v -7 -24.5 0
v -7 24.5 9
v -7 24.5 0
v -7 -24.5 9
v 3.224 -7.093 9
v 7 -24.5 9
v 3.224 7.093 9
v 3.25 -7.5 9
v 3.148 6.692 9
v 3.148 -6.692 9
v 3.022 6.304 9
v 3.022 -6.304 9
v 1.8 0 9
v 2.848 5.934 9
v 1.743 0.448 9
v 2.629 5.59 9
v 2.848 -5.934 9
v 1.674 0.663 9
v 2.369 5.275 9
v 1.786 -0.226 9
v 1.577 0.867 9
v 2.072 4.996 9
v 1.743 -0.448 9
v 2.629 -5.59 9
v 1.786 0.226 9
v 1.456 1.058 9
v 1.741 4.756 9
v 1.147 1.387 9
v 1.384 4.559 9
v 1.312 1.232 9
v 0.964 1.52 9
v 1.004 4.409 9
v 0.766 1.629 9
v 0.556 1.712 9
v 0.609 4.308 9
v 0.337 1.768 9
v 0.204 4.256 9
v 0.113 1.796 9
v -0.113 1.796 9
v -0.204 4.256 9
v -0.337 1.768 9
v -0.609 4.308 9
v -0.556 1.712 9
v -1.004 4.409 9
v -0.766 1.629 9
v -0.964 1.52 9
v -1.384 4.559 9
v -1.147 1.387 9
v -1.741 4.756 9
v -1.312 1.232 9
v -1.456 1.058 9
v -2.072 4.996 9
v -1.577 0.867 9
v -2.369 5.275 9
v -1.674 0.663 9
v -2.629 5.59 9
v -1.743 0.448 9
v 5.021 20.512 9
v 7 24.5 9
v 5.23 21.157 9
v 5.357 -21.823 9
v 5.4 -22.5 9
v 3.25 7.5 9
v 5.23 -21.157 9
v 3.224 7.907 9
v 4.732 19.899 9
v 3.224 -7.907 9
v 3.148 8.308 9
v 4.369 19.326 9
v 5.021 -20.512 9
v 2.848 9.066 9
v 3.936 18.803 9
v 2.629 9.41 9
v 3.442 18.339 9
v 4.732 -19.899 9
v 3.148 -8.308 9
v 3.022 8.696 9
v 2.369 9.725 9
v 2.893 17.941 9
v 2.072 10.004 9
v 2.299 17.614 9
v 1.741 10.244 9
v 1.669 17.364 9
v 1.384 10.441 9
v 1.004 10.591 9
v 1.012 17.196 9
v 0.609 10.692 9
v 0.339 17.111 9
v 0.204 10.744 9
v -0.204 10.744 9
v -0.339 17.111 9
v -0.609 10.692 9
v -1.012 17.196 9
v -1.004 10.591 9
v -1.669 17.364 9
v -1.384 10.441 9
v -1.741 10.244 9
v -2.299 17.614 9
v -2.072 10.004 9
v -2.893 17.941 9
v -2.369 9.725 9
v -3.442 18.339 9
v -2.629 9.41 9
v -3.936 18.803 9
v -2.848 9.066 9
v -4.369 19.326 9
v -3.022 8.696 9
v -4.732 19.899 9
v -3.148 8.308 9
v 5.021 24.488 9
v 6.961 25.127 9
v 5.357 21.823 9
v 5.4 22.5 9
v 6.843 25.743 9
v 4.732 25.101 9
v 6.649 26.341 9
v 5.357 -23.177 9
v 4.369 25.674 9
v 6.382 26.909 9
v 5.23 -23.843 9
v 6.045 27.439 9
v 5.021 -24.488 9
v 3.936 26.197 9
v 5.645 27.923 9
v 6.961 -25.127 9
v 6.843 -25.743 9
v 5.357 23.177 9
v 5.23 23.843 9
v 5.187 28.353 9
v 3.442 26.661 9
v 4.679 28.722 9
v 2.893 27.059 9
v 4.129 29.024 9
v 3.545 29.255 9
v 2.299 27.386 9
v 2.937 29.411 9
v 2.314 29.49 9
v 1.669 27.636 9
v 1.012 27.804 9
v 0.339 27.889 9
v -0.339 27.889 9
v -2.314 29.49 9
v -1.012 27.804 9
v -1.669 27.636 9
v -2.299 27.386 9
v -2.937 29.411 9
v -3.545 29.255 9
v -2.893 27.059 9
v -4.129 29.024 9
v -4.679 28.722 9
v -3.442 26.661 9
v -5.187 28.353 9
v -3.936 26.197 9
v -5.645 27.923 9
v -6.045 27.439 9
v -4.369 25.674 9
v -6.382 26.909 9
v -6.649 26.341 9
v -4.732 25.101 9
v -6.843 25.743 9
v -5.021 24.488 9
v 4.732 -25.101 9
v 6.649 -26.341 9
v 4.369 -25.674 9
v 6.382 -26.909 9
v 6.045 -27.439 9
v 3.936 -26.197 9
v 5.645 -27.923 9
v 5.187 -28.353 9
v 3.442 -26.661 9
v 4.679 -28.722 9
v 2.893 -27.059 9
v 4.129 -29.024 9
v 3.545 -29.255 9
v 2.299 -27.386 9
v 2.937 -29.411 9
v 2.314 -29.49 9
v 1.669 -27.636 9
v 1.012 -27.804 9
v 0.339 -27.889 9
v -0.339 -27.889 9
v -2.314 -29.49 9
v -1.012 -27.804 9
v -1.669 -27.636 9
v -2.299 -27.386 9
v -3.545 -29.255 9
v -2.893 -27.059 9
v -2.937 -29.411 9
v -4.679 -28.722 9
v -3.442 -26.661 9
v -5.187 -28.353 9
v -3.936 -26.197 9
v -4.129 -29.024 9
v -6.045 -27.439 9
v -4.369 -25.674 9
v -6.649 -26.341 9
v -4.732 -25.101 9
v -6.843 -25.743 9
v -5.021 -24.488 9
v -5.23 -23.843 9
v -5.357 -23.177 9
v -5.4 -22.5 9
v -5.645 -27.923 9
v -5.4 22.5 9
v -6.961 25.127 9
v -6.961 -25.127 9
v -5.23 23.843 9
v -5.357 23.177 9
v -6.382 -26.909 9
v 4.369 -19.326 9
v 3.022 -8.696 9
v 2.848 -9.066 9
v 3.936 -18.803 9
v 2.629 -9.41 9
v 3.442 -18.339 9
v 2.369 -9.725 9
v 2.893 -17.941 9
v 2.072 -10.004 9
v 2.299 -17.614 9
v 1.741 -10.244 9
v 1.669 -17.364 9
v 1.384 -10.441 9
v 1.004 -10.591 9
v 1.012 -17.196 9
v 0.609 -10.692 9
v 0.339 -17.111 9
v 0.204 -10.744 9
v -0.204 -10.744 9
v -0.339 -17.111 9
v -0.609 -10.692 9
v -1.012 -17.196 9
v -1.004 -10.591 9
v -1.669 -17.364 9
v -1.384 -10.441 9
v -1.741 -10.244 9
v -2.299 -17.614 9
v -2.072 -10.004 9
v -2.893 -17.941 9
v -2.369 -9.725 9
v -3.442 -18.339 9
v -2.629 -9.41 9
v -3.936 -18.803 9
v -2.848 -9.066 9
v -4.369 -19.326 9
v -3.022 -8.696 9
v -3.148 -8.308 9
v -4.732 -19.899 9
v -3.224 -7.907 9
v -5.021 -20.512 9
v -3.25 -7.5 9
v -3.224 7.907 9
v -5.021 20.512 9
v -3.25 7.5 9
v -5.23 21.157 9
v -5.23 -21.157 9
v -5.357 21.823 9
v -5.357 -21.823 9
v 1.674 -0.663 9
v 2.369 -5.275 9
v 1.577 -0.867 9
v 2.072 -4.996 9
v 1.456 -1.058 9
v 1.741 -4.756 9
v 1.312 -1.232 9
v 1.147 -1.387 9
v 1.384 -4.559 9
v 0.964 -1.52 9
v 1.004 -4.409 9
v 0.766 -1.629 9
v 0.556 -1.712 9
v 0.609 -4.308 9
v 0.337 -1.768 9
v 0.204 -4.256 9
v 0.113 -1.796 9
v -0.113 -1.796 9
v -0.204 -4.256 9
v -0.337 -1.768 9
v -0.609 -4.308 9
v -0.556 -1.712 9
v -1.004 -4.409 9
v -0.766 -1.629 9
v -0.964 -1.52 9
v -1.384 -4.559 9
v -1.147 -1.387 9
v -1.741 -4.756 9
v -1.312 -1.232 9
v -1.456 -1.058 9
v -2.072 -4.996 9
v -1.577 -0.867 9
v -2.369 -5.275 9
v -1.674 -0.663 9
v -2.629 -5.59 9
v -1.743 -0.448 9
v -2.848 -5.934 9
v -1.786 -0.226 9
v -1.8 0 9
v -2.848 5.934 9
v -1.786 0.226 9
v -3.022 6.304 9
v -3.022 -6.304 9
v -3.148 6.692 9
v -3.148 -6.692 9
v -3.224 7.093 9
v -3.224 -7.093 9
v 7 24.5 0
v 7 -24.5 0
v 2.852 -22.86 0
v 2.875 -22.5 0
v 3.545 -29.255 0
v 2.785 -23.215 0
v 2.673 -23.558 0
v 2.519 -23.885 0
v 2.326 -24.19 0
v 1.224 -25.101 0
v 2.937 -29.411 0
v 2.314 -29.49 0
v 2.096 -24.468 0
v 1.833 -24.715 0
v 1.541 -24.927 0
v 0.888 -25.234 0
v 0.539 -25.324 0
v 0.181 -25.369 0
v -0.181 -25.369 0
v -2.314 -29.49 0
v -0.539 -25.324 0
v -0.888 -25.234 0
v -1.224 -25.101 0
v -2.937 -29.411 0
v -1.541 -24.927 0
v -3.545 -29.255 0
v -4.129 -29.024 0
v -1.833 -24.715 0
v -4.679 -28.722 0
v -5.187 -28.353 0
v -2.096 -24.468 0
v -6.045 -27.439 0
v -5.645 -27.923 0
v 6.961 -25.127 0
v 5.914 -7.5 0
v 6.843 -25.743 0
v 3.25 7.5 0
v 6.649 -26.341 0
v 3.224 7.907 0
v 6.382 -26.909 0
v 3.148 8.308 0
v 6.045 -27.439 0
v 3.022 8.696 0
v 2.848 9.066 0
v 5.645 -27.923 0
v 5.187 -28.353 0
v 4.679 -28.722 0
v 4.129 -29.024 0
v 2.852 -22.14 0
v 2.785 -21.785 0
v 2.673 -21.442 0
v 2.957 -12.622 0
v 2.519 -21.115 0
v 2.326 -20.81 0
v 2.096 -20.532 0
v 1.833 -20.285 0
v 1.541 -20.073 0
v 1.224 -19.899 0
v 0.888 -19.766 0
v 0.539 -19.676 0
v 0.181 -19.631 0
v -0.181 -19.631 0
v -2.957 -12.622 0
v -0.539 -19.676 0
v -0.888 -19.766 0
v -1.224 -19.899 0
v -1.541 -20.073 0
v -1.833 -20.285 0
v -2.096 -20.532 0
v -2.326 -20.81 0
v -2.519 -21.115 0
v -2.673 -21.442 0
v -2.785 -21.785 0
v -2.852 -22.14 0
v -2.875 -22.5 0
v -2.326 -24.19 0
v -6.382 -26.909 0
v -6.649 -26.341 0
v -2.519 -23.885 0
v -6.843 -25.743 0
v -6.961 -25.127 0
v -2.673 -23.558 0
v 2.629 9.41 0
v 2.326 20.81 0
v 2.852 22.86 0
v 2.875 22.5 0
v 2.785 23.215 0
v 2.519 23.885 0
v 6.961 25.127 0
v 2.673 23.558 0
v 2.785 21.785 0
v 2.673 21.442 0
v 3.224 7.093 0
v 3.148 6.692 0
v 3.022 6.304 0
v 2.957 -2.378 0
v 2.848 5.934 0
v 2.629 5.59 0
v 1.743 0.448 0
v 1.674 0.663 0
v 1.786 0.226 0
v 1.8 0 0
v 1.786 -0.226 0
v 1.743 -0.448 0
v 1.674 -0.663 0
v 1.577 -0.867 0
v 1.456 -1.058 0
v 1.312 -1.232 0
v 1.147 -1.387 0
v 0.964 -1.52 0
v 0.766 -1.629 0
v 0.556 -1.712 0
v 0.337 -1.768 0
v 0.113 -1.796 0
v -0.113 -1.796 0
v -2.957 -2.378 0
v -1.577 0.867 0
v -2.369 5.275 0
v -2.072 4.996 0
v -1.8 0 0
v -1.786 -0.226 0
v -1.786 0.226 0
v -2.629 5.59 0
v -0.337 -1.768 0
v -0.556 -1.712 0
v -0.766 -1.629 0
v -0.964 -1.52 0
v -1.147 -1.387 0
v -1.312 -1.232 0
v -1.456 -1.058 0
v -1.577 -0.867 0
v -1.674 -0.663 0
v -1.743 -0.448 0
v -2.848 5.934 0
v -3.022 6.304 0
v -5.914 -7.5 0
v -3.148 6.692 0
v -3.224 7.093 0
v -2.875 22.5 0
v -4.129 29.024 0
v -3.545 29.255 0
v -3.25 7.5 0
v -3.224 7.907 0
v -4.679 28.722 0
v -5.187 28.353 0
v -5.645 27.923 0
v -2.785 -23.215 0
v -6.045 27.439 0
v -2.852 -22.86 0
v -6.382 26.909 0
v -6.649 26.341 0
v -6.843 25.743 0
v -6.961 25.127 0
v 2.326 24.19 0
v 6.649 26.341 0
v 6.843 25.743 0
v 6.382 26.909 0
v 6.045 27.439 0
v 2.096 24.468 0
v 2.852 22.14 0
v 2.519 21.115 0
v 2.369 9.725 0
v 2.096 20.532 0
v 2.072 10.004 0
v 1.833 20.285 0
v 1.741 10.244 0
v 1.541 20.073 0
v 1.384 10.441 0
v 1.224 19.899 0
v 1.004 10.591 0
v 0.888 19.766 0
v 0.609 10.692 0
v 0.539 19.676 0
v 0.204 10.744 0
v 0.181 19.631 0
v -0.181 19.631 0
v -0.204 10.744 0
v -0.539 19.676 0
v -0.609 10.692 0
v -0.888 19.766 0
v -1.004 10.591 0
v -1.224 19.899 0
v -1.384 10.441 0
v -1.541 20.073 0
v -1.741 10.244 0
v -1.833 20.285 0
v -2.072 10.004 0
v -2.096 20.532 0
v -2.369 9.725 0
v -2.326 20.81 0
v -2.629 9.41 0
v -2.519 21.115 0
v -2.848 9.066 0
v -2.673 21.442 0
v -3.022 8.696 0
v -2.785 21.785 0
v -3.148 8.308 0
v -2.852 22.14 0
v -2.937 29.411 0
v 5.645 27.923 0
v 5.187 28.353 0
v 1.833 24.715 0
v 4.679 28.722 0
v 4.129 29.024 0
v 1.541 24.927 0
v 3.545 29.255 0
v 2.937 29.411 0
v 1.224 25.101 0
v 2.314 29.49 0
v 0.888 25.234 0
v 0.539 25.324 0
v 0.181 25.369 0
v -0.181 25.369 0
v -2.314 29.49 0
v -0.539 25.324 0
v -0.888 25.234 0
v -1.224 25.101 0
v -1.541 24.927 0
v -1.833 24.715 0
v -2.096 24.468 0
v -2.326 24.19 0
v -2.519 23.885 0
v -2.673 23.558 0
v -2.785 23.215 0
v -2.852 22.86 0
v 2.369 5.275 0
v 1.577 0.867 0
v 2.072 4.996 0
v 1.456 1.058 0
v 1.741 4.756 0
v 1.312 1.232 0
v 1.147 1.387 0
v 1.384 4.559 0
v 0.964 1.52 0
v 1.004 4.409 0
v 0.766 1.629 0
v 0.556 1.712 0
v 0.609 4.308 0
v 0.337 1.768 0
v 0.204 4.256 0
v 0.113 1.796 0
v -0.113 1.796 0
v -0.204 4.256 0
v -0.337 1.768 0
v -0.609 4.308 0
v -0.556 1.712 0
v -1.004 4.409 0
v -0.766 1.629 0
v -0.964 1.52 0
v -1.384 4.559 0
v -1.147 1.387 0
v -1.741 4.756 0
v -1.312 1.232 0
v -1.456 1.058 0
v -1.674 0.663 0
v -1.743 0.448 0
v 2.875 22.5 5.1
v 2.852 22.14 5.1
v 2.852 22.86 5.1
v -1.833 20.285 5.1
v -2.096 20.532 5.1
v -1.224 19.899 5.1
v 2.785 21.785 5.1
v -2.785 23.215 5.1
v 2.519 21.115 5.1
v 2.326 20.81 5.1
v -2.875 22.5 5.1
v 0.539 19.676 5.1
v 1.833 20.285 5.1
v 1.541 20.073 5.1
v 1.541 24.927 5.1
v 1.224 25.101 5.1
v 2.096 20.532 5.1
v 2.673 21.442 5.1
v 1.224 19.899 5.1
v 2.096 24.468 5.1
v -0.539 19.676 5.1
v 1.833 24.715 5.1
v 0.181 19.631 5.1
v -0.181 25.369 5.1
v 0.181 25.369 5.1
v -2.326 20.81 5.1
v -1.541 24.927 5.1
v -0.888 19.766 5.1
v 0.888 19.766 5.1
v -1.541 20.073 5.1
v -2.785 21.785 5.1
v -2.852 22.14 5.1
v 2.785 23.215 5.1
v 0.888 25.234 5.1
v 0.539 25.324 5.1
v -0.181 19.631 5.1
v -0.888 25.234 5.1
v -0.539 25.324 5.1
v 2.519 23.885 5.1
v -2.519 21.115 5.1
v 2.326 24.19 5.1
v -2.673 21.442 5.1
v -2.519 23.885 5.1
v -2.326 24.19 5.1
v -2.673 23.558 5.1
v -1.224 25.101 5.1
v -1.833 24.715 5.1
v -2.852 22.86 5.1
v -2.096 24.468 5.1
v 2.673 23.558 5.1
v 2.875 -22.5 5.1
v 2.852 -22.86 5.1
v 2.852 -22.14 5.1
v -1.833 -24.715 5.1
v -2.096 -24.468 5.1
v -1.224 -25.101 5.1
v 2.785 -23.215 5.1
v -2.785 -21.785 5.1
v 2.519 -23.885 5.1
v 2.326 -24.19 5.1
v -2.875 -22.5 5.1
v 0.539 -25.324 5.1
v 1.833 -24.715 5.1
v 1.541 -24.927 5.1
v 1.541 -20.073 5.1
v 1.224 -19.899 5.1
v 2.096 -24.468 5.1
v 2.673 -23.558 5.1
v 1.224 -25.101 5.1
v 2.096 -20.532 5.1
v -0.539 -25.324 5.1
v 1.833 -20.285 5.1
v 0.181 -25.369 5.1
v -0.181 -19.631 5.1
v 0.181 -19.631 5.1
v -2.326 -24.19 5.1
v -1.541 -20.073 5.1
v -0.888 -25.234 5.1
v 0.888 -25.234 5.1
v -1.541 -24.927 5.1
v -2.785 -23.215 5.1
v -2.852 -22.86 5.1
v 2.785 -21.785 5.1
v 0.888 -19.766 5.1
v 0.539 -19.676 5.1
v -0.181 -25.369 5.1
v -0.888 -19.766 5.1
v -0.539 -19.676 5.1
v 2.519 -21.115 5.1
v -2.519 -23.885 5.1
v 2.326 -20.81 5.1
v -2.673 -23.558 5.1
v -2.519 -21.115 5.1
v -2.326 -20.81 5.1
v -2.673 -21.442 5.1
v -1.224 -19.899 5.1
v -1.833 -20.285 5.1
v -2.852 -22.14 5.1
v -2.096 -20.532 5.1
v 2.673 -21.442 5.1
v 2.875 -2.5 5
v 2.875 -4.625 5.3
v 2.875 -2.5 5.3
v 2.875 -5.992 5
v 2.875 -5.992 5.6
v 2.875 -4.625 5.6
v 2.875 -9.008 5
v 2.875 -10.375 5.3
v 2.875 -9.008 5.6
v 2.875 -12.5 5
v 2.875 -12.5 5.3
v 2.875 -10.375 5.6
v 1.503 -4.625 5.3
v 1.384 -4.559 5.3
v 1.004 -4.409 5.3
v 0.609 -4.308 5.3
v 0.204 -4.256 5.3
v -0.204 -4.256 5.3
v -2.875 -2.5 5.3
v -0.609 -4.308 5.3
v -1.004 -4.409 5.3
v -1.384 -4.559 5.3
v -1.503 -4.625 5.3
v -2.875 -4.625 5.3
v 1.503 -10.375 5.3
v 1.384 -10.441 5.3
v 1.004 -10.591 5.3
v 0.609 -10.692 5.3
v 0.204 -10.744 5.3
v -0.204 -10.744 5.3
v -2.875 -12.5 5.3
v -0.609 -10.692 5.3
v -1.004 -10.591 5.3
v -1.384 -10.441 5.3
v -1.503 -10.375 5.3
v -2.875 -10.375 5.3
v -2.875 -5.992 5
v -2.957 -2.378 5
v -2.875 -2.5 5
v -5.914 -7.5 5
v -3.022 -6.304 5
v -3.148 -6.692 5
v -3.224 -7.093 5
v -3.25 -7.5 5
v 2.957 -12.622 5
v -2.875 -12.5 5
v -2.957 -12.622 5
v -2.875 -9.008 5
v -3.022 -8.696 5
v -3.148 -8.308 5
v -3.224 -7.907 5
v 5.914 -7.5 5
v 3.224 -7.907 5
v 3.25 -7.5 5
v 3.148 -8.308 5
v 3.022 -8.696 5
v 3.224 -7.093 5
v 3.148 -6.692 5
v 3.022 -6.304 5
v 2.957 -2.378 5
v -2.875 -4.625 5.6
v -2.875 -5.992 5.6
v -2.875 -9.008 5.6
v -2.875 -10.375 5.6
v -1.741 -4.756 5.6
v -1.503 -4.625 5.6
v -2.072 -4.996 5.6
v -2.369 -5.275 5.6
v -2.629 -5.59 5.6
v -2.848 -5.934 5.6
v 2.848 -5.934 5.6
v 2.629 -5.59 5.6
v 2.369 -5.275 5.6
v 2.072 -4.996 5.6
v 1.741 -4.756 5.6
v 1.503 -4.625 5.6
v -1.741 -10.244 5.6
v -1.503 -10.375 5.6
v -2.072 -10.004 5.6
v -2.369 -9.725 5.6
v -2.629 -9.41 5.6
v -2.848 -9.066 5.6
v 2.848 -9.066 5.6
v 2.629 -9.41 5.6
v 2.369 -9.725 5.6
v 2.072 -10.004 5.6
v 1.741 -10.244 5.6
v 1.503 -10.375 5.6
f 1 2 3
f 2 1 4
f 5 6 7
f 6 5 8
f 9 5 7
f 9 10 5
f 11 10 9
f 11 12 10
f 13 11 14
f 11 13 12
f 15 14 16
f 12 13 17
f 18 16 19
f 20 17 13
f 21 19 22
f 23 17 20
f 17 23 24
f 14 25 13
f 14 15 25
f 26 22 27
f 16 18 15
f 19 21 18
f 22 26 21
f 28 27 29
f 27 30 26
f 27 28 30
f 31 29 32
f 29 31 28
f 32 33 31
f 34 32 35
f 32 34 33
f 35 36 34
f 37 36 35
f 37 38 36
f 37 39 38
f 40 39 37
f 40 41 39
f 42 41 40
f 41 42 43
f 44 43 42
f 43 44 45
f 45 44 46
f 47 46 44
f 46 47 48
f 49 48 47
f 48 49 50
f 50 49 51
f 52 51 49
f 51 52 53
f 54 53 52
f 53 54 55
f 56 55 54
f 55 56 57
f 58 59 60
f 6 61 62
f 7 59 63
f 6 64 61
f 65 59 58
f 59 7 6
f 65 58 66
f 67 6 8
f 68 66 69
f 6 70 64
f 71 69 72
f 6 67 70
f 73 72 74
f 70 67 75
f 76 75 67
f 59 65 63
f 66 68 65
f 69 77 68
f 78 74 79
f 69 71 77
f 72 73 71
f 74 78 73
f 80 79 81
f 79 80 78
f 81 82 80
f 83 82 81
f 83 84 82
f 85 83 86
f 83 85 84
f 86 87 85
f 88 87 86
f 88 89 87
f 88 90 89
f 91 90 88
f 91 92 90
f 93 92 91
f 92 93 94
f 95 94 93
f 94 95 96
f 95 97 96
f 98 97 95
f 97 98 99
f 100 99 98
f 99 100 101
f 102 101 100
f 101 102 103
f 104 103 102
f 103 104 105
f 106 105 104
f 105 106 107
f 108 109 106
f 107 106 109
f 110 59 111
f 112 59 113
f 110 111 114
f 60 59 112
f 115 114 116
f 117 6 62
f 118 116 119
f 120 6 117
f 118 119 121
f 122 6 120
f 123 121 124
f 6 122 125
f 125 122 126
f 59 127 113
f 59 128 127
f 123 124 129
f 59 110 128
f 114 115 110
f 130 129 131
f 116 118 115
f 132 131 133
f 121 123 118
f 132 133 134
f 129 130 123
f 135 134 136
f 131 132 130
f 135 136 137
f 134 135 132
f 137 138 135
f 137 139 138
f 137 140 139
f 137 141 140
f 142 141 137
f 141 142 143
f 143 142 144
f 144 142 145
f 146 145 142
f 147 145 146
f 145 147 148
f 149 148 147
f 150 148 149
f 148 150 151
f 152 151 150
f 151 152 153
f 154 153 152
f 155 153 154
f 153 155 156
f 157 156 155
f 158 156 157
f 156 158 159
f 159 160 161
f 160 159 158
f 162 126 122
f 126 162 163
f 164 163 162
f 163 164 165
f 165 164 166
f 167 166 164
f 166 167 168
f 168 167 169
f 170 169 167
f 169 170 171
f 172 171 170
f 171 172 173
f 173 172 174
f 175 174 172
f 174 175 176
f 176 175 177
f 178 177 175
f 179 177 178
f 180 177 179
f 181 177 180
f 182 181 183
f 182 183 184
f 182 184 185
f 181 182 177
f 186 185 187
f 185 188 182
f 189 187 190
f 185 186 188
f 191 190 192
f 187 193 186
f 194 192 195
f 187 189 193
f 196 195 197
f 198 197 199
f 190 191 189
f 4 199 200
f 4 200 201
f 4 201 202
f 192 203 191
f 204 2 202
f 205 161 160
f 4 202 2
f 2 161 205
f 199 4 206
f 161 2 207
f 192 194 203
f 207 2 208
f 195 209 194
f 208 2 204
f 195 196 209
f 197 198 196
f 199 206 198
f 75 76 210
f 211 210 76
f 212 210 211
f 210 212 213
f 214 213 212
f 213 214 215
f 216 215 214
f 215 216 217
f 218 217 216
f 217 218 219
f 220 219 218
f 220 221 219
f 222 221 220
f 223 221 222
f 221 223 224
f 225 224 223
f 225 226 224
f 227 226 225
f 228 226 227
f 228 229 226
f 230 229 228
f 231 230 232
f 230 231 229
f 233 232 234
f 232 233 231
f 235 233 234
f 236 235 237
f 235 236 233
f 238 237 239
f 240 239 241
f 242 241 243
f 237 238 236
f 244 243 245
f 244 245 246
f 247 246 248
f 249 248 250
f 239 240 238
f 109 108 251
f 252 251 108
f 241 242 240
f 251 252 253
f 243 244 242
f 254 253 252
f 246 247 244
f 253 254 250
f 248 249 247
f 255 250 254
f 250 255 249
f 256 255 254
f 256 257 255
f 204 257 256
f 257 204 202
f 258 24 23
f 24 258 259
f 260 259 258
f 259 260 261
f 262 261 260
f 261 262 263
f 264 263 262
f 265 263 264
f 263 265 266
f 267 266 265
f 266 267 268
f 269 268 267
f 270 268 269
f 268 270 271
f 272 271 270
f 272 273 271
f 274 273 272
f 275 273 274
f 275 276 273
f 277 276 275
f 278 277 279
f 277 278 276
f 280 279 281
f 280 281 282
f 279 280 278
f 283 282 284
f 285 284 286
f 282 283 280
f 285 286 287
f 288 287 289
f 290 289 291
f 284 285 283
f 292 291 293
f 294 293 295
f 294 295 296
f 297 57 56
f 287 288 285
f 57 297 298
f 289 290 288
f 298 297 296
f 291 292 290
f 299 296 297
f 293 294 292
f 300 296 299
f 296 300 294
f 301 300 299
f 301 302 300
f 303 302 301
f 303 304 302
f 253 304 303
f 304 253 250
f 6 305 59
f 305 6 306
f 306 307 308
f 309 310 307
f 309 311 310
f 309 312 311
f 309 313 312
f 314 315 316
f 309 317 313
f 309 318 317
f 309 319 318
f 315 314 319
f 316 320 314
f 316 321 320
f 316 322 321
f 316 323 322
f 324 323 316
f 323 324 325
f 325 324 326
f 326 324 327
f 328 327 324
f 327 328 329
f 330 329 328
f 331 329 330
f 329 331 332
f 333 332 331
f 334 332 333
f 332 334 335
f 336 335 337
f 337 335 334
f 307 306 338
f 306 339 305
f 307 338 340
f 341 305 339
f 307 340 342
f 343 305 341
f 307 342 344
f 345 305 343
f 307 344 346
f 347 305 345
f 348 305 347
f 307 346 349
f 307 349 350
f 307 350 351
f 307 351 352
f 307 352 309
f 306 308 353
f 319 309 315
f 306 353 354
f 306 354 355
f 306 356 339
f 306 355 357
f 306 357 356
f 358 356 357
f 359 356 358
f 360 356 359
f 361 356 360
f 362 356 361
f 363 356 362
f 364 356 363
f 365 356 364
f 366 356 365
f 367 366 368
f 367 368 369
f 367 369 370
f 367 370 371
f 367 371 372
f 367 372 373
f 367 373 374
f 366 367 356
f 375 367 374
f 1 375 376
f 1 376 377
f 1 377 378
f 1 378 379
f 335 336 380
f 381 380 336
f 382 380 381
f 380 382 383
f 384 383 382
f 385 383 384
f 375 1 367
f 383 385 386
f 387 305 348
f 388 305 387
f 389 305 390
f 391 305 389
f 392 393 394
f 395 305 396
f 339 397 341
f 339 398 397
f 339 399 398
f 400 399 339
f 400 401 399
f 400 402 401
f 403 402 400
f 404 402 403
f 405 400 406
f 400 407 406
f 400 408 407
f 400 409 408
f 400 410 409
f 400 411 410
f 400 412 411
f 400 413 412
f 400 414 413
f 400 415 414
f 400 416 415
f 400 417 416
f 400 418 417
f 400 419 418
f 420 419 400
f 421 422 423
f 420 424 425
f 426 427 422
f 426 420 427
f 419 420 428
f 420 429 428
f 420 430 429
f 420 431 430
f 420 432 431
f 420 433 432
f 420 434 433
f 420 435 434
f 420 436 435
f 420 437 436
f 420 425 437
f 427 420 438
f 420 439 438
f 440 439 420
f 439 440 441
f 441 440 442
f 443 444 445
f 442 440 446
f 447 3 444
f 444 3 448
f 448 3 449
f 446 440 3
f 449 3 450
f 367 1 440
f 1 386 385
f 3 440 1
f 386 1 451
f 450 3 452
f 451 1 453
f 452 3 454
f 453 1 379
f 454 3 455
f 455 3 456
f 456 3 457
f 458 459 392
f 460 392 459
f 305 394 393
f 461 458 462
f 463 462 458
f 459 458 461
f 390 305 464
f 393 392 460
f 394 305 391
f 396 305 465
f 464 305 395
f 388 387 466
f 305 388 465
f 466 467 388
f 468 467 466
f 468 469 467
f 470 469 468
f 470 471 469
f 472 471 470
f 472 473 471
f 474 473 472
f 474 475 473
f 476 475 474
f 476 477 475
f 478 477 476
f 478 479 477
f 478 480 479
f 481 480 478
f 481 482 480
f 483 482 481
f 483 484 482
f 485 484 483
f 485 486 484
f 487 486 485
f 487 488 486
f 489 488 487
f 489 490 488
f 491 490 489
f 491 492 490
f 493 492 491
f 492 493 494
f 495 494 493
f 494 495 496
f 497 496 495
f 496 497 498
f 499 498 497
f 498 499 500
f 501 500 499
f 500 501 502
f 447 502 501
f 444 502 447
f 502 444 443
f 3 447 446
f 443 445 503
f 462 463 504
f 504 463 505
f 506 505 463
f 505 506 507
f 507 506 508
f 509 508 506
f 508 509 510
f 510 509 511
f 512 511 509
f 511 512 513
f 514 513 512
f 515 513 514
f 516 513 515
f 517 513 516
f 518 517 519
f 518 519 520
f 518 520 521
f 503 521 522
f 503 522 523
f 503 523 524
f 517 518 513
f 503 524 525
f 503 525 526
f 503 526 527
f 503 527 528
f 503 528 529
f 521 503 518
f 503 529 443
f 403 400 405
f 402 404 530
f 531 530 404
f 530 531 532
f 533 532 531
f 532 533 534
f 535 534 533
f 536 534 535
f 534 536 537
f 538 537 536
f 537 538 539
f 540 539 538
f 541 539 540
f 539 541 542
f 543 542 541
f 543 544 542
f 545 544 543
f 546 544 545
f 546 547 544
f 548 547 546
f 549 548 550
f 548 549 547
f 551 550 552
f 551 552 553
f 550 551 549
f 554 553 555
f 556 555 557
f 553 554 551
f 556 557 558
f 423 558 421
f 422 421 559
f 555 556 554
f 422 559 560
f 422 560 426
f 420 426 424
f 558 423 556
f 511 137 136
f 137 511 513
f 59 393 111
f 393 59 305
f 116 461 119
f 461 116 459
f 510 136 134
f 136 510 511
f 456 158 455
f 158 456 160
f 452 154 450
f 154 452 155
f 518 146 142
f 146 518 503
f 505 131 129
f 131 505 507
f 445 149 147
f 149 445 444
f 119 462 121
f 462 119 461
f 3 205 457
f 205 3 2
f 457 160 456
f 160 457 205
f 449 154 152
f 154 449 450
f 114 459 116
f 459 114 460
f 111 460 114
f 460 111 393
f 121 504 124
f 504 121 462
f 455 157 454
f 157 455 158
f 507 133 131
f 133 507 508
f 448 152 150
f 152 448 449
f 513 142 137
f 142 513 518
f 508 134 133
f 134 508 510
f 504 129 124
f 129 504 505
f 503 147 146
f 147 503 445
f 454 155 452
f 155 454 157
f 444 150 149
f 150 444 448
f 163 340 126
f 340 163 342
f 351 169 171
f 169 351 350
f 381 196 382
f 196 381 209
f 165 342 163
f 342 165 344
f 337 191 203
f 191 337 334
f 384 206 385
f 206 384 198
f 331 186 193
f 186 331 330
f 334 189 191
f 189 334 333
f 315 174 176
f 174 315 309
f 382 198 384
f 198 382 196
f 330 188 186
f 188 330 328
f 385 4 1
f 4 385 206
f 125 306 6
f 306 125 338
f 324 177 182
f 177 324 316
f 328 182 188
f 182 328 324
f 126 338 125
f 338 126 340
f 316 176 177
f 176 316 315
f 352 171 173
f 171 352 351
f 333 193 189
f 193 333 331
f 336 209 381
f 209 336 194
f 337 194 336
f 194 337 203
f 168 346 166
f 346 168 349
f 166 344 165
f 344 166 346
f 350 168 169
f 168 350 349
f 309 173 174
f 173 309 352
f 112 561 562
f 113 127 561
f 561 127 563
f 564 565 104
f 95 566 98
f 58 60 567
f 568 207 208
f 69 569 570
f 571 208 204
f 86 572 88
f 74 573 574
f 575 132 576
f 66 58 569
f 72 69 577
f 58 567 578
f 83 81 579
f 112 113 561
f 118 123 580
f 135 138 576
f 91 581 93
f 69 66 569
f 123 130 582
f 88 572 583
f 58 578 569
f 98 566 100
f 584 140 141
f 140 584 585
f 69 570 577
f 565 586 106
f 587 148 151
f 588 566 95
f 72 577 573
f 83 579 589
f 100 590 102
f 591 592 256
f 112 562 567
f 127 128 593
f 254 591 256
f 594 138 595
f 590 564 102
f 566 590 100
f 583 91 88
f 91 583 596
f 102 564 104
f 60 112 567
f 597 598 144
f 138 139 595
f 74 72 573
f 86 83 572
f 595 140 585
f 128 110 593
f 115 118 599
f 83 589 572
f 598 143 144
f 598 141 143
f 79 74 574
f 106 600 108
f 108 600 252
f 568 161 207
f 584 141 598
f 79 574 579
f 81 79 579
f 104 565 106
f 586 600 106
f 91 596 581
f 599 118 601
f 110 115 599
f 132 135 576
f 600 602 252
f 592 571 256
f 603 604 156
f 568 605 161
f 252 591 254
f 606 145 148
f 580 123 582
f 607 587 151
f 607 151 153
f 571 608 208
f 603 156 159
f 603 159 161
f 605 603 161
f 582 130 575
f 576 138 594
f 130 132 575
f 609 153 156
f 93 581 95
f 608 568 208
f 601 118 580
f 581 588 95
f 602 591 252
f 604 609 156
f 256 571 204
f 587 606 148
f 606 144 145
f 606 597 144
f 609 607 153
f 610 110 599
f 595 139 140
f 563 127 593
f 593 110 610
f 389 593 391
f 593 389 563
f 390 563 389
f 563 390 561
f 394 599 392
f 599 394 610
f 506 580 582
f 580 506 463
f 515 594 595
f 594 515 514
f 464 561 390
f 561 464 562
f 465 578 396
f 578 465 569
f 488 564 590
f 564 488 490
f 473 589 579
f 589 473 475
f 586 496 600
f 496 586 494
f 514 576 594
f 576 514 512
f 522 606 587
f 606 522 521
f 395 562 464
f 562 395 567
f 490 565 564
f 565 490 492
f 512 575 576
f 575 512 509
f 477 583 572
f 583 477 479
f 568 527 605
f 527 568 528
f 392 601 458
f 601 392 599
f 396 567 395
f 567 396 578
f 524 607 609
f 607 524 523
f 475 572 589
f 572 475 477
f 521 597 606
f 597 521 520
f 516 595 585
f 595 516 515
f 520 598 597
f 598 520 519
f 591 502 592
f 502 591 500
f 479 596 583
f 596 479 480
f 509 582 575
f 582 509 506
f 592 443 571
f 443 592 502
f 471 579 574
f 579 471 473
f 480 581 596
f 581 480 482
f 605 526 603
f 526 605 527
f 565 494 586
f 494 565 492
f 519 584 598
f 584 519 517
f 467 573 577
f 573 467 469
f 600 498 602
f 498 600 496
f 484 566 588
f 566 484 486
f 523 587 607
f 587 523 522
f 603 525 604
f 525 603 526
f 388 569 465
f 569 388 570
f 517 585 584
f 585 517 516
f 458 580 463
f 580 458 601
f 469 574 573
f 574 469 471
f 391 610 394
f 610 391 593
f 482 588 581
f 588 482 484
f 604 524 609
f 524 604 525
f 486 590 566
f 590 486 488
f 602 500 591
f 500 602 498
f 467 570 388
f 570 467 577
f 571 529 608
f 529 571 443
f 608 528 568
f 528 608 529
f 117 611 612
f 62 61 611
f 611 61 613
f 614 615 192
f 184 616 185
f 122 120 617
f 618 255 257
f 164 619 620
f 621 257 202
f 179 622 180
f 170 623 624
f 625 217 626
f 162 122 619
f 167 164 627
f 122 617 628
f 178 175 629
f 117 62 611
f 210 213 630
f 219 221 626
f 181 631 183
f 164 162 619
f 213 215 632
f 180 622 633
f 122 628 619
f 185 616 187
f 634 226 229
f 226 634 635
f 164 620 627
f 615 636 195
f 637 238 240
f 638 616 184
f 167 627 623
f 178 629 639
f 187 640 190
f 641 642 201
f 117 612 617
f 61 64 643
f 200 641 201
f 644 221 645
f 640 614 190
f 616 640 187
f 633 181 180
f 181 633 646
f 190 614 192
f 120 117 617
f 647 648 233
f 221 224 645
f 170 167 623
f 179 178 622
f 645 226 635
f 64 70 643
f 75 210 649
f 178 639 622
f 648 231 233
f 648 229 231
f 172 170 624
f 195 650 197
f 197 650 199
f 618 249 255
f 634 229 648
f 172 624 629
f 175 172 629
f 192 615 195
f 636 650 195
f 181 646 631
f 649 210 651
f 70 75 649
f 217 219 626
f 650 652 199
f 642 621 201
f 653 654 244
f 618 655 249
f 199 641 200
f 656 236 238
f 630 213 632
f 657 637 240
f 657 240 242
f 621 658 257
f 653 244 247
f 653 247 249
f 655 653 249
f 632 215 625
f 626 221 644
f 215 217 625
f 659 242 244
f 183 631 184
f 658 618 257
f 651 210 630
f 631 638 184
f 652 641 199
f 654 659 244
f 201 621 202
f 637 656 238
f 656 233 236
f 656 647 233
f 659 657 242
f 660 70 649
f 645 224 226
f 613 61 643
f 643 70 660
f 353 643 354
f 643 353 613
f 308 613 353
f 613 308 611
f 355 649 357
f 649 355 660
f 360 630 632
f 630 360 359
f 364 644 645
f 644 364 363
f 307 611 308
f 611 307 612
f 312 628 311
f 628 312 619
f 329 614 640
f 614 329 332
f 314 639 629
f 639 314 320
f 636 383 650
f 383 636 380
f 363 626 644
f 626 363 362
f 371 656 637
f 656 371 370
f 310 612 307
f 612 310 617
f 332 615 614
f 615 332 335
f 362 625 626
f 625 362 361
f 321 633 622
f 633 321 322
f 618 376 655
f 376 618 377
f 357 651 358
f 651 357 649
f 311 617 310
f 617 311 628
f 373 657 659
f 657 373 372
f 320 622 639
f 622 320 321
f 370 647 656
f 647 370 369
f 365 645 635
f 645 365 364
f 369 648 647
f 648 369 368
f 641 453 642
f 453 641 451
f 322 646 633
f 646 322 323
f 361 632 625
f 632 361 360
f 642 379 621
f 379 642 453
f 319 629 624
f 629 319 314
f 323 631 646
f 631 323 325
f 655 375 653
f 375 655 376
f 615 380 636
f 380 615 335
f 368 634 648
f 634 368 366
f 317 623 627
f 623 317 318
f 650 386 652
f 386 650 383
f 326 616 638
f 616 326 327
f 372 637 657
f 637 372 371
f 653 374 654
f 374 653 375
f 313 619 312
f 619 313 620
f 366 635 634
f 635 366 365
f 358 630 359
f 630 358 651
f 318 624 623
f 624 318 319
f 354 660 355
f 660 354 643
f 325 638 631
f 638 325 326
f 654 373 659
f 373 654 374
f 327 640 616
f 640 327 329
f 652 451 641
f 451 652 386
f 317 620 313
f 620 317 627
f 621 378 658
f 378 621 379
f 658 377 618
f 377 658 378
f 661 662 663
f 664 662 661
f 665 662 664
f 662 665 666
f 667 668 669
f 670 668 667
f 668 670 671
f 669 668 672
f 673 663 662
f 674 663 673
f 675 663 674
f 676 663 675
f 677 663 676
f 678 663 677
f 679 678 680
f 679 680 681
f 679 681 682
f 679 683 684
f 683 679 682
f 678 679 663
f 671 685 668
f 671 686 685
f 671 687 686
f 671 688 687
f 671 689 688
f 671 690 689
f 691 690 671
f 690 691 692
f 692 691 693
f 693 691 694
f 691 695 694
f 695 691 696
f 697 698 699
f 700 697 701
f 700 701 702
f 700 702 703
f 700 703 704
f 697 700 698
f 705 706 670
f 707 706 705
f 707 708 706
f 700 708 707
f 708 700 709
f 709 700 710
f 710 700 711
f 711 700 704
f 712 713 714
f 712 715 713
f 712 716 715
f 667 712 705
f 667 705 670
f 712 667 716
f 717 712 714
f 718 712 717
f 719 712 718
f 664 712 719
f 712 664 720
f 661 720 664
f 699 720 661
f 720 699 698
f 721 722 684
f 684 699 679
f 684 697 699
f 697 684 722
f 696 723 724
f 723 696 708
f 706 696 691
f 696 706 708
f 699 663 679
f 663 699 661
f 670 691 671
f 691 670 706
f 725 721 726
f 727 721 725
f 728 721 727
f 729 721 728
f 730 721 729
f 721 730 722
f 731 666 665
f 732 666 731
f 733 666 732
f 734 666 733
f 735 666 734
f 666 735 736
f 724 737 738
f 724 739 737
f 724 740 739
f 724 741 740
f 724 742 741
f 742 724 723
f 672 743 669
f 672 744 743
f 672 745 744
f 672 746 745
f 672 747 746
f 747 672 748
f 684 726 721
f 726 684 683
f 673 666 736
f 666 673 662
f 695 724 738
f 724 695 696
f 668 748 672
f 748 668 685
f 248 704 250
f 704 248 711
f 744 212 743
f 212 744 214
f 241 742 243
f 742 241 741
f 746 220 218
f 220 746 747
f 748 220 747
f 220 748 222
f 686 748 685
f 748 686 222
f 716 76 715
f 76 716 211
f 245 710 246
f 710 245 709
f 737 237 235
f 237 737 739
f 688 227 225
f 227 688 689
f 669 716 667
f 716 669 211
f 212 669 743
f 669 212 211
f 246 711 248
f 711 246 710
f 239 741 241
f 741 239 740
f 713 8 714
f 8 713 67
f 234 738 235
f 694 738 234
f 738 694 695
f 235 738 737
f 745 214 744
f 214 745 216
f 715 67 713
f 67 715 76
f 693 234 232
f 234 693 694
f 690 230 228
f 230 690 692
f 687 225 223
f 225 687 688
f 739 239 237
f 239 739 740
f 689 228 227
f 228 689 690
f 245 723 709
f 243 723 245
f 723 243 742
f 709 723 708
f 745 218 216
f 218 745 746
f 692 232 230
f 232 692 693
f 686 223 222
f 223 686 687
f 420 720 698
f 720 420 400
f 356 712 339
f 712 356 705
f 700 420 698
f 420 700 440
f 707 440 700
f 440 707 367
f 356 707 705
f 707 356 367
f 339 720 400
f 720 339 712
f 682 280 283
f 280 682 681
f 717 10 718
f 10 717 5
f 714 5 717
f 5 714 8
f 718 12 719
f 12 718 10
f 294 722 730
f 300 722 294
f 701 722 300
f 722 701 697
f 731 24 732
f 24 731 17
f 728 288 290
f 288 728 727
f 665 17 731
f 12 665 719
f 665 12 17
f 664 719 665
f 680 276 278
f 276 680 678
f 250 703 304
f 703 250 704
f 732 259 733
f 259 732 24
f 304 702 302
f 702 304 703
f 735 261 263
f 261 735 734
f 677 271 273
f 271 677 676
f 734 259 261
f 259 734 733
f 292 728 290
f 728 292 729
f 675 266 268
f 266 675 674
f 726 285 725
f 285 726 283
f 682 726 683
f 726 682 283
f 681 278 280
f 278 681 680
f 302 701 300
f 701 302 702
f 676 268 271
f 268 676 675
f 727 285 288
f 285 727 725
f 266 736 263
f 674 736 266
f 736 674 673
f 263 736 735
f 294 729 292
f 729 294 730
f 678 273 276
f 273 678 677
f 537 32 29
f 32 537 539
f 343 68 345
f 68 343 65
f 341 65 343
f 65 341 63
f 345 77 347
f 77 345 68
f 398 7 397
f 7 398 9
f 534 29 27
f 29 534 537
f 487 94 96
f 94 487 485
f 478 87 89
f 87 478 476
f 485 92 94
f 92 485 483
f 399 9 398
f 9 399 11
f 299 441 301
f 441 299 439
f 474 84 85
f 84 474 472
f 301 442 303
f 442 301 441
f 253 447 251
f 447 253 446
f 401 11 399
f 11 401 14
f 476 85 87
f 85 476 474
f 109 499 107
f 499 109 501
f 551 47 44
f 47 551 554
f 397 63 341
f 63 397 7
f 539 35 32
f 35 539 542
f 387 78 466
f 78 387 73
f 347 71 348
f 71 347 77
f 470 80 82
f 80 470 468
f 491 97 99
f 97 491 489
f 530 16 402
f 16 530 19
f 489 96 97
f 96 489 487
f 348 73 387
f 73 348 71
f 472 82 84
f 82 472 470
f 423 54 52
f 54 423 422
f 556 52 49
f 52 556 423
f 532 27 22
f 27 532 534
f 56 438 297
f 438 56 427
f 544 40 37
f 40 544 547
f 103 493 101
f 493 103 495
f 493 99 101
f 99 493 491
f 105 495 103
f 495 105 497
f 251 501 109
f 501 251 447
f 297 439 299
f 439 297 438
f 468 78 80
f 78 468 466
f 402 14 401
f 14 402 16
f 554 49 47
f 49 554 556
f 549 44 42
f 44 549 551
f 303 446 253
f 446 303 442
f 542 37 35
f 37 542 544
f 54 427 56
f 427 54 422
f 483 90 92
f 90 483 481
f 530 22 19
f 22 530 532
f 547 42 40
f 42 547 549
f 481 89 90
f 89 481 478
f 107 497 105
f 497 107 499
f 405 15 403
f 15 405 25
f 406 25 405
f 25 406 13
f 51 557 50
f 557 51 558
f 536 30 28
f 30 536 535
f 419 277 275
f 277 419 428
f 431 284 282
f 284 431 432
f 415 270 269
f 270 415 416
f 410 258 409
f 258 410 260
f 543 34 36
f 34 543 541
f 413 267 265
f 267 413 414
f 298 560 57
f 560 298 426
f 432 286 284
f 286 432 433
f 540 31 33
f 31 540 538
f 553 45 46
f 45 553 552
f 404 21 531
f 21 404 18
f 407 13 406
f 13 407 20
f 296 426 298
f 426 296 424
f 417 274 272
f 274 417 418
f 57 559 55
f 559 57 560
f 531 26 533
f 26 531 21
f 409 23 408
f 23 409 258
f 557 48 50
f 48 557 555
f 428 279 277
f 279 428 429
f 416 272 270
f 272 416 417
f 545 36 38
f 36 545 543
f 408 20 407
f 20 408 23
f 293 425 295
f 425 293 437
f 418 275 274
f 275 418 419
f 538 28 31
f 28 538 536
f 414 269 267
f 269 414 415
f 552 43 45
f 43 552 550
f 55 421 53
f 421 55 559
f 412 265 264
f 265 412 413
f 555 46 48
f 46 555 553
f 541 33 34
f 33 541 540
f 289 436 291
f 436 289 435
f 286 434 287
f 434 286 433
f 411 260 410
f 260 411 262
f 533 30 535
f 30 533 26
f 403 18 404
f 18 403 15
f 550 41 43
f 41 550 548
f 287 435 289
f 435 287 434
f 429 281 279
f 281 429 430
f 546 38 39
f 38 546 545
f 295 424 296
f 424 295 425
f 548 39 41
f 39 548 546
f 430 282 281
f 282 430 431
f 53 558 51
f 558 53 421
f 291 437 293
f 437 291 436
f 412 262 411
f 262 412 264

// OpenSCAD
$fn = 50;


difference() {
	union() {
		hull() {
			translate(v = [-2.0000000000, 9.5000000000, 0]) {
				cylinder(h = 9, r = 5);
			}
			translate(v = [2.0000000000, 9.5000000000, 0]) {
				cylinder(h = 9, r = 5);
			}
			translate(v = [-2.0000000000, -9.5000000000, 0]) {
				cylinder(h = 9, r = 5);
			}
			translate(v = [2.0000000000, -9.5000000000, 0]) {
				cylinder(h = 9, r = 5);
			}
		}
		translate(v = [0.0000000000, 15.0000000000, 0]) {
			hull() {
				translate(v = [-2.0000000000, 9.5000000000, 0]) {
					cylinder(h = 9, r = 5);
				}
				translate(v = [2.0000000000, 9.5000000000, 0]) {
					cylinder(h = 9, r = 5);
				}
				translate(v = [-2.0000000000, -9.5000000000, 0]) {
					cylinder(h = 9, r = 5);
				}
				translate(v = [2.0000000000, -9.5000000000, 0]) {
					cylinder(h = 9, r = 5);
				}
			}
		}
		translate(v = [0.0000000000, 15.0000000000, 0]) {
			hull() {
				translate(v = [-2.0000000000, 9.5000000000, 0]) {
					cylinder(h = 9, r = 5);
				}
				translate(v = [2.0000000000, 9.5000000000, 0]) {
					cylinder(h = 9, r = 5);
				}
				translate(v = [-2.0000000000, -9.5000000000, 0]) {
					cylinder(h = 9, r = 5);
				}
				translate(v = [2.0000000000, -9.5000000000, 0]) {
					cylinder(h = 9, r = 5);
				}
			}
		}
		translate(v = [0.0000000000, -15.0000000000, 0]) {
			hull() {
				translate(v = [-2.0000000000, 9.5000000000, 0]) {
					cylinder(h = 9, r = 5);
				}
				translate(v = [2.0000000000, 9.5000000000, 0]) {
					cylinder(h = 9, r = 5);
				}
				translate(v = [-2.0000000000, -9.5000000000, 0]) {
					cylinder(h = 9, r = 5);
				}
				translate(v = [2.0000000000, -9.5000000000, 0]) {
					cylinder(h = 9, r = 5);
				}
			}
		}
		translate(v = [0.0000000000, -15.0000000000, 0]) {
			hull() {
				translate(v = [-2.0000000000, 9.5000000000, 0]) {
					cylinder(h = 9, r = 5);
				}
				translate(v = [2.0000000000, 9.5000000000, 0]) {
					cylinder(h = 9, r = 5);
				}
				translate(v = [-2.0000000000, -9.5000000000, 0]) {
					cylinder(h = 9, r = 5);
				}
				translate(v = [2.0000000000, -9.5000000000, 0]) {
					cylinder(h = 9, r = 5);
				}
			}
		}
	}
	union() {
		translate(v = [0.0000000000, 22.5000000000, 9]) {
			rotate(a = [0, 0, 0]) {
				difference() {
					union() {
						#translate(v = [0, 0, -9.0000000000]) {
							cylinder(h = 9, r = 2.6000000000);
						}
						#translate(v = [0, 0, -3.9000000000]) {
							cylinder(h = 3.9000000000, r1 = 2.8750000000, r2 = 5.4000000000);
						}
						#translate(v = [0, 0, -9.0000000000]) {
							cylinder(h = 9, r = 2.8750000000);
						}
						#translate(v = [0, 0, -9.0000000000]) {
							cylinder(h = 9, r = 2.6000000000);
						}
					}
					union();
				}
			}
		}
		translate(v = [0.0000000000, 22.5000000000, 9]) {
			rotate(a = [0, 0, 0]) {
				difference() {
					union() {
						#translate(v = [0, 0, -9.0000000000]) {
							cylinder(h = 9, r = 2.6000000000);
						}
						#translate(v = [0, 0, -3.9000000000]) {
							cylinder(h = 3.9000000000, r1 = 2.8750000000, r2 = 5.4000000000);
						}
						#translate(v = [0, 0, -9.0000000000]) {
							cylinder(h = 9, r = 2.8750000000);
						}
						#translate(v = [0, 0, -9.0000000000]) {
							cylinder(h = 9, r = 2.6000000000);
						}
					}
					union();
				}
			}
		}
		translate(v = [0.0000000000, -22.5000000000, 9]) {
			rotate(a = [0, 0, 0]) {
				difference() {
					union() {
						#translate(v = [0, 0, -9.0000000000]) {
							cylinder(h = 9, r = 2.6000000000);
						}
						#translate(v = [0, 0, -3.9000000000]) {
							cylinder(h = 3.9000000000, r1 = 2.8750000000, r2 = 5.4000000000);
						}
						#translate(v = [0, 0, -9.0000000000]) {
							cylinder(h = 9, r = 2.8750000000);
						}
						#translate(v = [0, 0, -9.0000000000]) {
							cylinder(h = 9, r = 2.6000000000);
						}
					}
					union();
				}
			}
		}
		translate(v = [0.0000000000, -22.5000000000, 9]) {
			rotate(a = [0, 0, 0]) {
				difference() {
					union() {
						#translate(v = [0, 0, -9.0000000000]) {
							cylinder(h = 9, r = 2.6000000000);
						}
						#translate(v = [0, 0, -3.9000000000]) {
							cylinder(h = 3.9000000000, r1 = 2.8750000000, r2 = 5.4000000000);
						}
						#translate(v = [0, 0, -9.0000000000]) {
							cylinder(h = 9, r = 2.8750000000);
						}
						#translate(v = [0, 0, -9.0000000000]) {
							cylinder(h = 9, r = 2.6000000000);
						}
					}
					union();
				}
			}
		}
		translate(v = [0.0000000000, -7.5000000000, 0]) {
			rotate(a = [0, 0, 0]) {
				difference() {
					union() {
						#translate(v = [-2.8750000000, -5.0000000000, -0.3000000000]) {
							cube(size = [5.7500000000, 10, 0.3000000000]);
						}
						#translate(v = [-2.8750000000, -2.8750000000, -0.6000000000]) {
							cube(size = [5.7500000000, 5.7500000000, 0.3000000000]);
						}
						#translate(v = [-2.8750000000, -5.0000000000, 5]) {
							cube(size = [5.7500000000, 10, 0.3000000000]);
						}
						#translate(v = [-2.8750000000, -2.8750000000, 5.3000000000]) {
							cube(size = [5.7500000000, 5.7500000000, 0.3000000000]);
						}
						#translate(v = [0, 0, -100.0000000000]) {
							cylinder(h = 200, r = 3.2500000000);
						}
						#linear_extrude(height = 5) {
							polygon(points = [[5.9142500000, 0.0000000000], [2.9571250000, 5.1218907443], [-2.9571250000, 5.1218907443], [-5.9142500000, 0.0000000000], [-2.9571250000, -5.1218907443], [2.9571250000, -5.1218907443]]);
						}
						#translate(v = [-2.8750000000, -5.0000000000, -0.3000000000]) {
							cube(size = [5.7500000000, 10, 0.3000000000]);
						}
						#translate(v = [-2.8750000000, -2.8750000000, -0.6000000000]) {
							cube(size = [5.7500000000, 5.7500000000, 0.3000000000]);
						}
						#translate(v = [-2.8750000000, -5.0000000000, 5]) {
							cube(size = [5.7500000000, 10, 0.3000000000]);
						}
						#translate(v = [-2.8750000000, -2.8750000000, 5.3000000000]) {
							cube(size = [5.7500000000, 5.7500000000, 0.3000000000]);
						}
						#translate(v = [0, 0, -100.0000000000]) {
							cylinder(h = 200, r = 3.2500000000);
						}
						#translate(v = [-2.8750000000, -5.0000000000, -0.3000000000]) {
							cube(size = [5.7500000000, 10, 0.3000000000]);
						}
						#translate(v = [-2.8750000000, -2.8750000000, -0.6000000000]) {
							cube(size = [5.7500000000, 5.7500000000, 0.3000000000]);
						}
						#translate(v = [-2.8750000000, -5.0000000000, 5]) {
							cube(size = [5.7500000000, 10, 0.3000000000]);
						}
						#translate(v = [-2.8750000000, -2.8750000000, 5.3000000000]) {
							cube(size = [5.7500000000, 5.7500000000, 0.3000000000]);
						}
						#translate(v = [0, 0, -100.0000000000]) {
							cylinder(h = 200, r = 3.2500000000);
						}
					}
					union();
				}
			}
		}
		translate(v = [0.0000000000, -7.5000000000, 0]) {
			translate(v = [0, 0, -100]) {
				cylinder(h = 200, r = 3.2500000000);
			}
		}
		translate(v = [0.0000000000, 7.5000000000, 0]) {
			translate(v = [0, 0, -100]) {
				cylinder(h = 200, r = 3.2500000000);
			}
		}
		translate(v = [0.0000000000, -7.5000000000, 0]) {
			translate(v = [0, 0, -100]) {
				cylinder(h = 200, r = 1.8000000000);
			}
		}
		translate(v = [0, 0, -100]) {
			cylinder(h = 200, r = 1.8000000000);
		}
		translate(v = [0.0000000000, 7.5000000000, 0]) {
			translate(v = [0, 0, -100]) {
				cylinder(h = 200, r = 1.8000000000);
			}
		}
	}
}
